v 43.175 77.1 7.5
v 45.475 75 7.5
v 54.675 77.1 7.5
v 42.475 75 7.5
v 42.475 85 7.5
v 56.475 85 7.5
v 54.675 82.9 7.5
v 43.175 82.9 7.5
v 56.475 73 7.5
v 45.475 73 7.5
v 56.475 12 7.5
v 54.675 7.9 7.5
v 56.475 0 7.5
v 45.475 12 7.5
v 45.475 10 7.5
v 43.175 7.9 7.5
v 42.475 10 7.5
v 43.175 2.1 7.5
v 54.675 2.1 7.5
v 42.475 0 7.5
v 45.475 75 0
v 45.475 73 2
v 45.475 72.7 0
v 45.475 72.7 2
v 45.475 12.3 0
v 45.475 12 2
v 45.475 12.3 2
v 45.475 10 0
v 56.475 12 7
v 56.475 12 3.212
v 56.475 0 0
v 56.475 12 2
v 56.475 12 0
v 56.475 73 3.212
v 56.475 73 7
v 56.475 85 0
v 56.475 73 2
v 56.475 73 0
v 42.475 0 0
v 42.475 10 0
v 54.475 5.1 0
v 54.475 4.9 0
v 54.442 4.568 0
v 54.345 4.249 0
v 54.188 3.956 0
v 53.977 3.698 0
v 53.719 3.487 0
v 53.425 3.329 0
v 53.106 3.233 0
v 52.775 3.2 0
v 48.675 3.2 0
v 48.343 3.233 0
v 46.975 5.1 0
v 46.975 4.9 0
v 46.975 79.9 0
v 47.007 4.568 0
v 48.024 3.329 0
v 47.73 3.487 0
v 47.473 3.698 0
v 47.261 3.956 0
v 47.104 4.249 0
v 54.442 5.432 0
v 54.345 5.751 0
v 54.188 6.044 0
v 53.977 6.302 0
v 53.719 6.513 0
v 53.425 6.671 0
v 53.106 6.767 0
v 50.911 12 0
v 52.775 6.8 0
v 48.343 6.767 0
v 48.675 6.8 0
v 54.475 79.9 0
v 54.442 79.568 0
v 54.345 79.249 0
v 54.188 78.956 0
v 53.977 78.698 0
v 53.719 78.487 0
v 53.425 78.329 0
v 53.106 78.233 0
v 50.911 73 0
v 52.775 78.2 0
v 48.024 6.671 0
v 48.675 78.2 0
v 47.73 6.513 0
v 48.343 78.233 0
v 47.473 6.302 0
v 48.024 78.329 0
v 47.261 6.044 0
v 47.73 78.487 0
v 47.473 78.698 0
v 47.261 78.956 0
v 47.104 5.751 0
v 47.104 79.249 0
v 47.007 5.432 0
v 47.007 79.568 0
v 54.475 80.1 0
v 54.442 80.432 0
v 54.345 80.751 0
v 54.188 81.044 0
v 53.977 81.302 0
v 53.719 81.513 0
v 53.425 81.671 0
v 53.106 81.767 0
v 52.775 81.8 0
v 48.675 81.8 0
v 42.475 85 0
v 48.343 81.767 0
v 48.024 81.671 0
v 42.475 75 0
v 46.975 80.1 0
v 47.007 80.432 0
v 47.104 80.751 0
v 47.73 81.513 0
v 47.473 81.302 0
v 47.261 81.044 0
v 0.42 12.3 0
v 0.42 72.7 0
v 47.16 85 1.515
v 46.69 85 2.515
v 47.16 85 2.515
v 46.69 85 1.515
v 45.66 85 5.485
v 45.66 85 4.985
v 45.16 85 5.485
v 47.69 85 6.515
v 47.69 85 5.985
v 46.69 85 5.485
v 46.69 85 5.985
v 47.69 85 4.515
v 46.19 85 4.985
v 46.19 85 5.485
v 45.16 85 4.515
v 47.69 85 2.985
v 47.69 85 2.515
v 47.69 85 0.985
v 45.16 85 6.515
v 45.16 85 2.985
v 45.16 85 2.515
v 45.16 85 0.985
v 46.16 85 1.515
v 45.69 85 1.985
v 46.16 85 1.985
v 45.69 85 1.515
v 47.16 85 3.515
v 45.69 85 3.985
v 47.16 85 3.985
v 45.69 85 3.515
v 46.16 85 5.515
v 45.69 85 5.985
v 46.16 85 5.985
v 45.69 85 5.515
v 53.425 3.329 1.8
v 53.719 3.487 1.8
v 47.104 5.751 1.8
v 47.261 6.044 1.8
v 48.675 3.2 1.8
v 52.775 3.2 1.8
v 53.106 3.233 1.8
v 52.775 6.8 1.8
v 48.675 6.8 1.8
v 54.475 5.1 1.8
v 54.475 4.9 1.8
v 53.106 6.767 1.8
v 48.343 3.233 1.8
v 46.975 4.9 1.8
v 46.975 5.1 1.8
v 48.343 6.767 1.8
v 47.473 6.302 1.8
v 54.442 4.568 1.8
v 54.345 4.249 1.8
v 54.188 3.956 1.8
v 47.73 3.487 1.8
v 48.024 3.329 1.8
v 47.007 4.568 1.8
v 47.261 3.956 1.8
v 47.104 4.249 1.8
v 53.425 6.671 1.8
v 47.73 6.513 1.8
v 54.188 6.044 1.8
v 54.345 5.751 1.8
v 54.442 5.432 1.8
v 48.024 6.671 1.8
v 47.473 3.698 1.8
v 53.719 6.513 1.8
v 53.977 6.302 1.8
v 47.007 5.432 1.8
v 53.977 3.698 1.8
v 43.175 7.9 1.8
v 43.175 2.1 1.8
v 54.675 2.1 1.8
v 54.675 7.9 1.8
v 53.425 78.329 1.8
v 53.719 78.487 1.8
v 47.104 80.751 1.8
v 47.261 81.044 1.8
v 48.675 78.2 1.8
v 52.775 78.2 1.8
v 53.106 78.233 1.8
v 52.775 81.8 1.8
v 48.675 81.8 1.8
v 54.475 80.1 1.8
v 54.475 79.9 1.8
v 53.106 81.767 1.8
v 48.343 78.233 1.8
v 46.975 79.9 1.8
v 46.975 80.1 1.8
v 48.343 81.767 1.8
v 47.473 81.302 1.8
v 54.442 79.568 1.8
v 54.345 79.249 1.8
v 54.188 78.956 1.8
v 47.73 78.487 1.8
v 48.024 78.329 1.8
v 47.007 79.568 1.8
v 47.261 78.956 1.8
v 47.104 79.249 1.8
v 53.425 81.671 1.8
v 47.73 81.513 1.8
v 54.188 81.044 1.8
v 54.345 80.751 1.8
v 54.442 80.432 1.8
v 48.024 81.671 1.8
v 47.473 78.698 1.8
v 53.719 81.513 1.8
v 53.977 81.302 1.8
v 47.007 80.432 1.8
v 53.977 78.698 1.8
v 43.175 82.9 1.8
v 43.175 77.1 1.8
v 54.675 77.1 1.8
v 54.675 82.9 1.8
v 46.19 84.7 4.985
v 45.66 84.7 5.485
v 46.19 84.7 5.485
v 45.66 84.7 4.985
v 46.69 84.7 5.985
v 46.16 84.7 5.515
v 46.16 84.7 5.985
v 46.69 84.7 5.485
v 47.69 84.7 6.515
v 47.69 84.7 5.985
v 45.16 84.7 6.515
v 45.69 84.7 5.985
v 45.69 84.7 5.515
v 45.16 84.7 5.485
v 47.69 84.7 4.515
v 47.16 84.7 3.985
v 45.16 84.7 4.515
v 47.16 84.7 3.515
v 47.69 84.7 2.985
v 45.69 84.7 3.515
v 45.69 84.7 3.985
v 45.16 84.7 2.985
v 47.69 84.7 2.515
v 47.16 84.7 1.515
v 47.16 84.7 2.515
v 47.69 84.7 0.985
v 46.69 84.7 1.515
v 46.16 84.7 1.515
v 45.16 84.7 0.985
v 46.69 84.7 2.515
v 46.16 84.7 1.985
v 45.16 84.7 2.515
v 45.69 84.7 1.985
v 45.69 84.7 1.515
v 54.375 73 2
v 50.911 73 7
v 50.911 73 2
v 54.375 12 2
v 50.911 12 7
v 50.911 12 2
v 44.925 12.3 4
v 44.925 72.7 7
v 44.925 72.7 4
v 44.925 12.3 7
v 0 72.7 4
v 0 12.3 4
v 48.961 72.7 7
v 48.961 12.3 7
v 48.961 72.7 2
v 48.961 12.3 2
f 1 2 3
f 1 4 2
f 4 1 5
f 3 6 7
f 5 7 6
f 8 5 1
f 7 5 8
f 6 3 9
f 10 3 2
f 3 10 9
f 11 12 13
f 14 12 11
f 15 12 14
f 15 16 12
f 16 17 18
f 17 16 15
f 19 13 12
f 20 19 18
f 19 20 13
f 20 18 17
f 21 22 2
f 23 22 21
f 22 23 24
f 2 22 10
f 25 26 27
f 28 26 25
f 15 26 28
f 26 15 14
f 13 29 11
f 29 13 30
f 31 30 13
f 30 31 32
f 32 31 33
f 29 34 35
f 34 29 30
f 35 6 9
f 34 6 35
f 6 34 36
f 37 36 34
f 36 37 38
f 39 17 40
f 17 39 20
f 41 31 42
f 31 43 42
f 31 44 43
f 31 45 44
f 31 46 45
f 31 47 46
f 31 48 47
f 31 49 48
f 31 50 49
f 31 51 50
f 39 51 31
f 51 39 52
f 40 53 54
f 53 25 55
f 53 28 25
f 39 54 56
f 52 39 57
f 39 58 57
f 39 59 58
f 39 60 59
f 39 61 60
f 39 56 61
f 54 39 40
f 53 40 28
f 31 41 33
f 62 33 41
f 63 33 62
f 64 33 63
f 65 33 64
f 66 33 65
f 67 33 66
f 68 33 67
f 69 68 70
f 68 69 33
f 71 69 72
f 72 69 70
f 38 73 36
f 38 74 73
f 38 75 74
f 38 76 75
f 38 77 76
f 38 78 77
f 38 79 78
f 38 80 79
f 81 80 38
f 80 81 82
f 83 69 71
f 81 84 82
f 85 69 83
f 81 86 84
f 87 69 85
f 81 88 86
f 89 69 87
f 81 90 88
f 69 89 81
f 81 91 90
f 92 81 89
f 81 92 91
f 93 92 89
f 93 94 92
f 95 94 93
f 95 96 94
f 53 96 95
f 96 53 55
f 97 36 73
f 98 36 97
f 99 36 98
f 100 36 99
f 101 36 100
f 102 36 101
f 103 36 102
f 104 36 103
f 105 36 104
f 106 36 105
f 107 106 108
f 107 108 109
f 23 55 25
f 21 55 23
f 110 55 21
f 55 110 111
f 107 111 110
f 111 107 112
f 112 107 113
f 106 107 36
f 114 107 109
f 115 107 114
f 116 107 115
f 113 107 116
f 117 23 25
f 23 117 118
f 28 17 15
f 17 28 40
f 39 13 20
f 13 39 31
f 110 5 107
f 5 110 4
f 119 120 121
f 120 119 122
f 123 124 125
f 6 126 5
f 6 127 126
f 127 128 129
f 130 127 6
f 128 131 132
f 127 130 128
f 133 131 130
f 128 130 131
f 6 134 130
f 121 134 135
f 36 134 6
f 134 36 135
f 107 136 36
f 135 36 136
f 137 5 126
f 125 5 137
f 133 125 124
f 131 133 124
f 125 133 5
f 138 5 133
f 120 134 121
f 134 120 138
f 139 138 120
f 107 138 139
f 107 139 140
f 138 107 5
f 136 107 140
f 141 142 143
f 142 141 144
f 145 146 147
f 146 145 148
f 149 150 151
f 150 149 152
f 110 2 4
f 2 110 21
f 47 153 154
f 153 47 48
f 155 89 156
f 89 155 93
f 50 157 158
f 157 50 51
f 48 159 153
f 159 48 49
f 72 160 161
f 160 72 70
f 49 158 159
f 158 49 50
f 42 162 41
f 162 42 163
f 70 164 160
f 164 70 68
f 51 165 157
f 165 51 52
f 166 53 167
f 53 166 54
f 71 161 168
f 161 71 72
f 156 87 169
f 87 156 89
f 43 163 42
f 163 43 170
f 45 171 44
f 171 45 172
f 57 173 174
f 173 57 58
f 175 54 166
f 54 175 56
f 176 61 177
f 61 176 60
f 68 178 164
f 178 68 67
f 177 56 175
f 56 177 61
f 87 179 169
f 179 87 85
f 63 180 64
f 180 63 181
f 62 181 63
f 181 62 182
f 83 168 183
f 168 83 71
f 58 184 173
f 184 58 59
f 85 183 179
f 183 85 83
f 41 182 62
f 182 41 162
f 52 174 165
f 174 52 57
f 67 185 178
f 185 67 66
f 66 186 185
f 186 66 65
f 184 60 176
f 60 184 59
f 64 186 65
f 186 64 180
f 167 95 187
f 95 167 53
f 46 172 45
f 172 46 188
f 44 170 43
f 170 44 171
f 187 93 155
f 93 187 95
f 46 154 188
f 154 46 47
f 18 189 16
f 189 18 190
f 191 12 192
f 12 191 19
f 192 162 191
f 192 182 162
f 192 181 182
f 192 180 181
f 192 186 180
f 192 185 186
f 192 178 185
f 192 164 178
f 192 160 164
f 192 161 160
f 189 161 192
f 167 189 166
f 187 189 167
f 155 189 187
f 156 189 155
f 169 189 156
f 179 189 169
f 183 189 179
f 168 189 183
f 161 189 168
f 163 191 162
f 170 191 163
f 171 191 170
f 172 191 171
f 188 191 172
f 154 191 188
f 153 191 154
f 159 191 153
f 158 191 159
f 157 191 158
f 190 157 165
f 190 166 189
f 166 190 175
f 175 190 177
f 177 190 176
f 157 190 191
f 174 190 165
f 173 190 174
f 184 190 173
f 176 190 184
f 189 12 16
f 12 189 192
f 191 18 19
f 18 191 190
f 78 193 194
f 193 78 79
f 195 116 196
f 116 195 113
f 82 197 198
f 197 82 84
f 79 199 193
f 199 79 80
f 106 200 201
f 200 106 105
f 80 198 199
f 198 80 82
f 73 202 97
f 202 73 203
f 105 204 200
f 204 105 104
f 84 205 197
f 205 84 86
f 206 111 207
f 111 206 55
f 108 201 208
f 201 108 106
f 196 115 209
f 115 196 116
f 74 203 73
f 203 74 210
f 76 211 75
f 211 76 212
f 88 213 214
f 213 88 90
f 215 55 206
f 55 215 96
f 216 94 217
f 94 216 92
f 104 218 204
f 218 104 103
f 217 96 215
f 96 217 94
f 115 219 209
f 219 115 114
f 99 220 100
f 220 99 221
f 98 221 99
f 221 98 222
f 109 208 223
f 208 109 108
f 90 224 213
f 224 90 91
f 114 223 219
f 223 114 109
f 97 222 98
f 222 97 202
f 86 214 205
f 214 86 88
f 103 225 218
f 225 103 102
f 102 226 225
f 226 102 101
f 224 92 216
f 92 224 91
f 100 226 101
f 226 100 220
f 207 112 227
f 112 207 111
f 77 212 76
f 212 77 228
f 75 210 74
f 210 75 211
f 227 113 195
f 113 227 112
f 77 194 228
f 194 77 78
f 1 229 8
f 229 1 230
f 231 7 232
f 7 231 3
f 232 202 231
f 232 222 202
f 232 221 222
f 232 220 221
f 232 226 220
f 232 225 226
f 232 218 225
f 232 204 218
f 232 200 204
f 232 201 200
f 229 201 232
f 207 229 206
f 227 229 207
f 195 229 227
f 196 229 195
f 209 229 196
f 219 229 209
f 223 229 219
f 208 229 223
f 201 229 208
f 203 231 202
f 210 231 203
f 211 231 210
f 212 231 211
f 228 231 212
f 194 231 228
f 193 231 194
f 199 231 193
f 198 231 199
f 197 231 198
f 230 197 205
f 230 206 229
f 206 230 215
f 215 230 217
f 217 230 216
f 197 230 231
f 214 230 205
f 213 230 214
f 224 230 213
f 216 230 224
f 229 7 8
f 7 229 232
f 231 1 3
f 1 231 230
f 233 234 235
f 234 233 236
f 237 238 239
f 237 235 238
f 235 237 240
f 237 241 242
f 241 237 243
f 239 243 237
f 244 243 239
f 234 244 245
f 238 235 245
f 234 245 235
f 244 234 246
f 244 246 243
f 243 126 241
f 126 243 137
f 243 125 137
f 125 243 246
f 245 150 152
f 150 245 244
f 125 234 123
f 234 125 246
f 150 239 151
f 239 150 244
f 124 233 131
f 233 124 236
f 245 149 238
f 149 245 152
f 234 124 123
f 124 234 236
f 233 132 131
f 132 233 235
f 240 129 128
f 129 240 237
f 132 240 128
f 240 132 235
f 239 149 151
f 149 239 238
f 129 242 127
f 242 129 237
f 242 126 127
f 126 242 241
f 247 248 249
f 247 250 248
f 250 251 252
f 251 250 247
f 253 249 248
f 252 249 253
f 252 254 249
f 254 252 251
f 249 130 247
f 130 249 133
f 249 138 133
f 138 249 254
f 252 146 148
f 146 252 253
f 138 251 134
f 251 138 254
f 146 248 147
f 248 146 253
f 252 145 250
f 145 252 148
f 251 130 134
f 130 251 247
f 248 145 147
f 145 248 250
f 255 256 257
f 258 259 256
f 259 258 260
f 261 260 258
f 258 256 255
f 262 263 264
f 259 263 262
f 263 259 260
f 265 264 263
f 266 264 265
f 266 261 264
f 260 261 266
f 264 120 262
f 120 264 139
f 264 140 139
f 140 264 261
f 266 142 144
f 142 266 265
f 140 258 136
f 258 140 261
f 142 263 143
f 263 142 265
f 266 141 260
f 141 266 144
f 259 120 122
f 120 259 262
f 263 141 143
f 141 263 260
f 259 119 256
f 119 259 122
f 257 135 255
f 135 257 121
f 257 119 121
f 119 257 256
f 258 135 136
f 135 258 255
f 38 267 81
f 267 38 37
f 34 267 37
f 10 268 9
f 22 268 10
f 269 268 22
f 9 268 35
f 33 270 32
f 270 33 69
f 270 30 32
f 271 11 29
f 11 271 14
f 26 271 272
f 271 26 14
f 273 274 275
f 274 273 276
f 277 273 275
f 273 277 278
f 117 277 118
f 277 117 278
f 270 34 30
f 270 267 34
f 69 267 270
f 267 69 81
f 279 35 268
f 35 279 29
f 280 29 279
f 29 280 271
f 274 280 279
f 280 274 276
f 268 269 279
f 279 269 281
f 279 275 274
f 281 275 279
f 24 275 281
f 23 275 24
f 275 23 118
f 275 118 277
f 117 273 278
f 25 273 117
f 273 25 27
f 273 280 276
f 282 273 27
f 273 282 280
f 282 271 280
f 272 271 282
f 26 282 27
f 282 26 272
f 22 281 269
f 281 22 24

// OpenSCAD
// 固定耳齊平與滿寬直貼膠分牌閘
$fn=64;
translate([120.92467,42.5,-43]){rotate([0,-90,0]){union(){difference(){difference(){difference(){difference(){difference(){difference(){difference(){difference(){union(){union(){translate([44.5,-33,64.45]){cube([6,66,11]);}translate([43,-42.5,64.45]){cube([7.5,10,14]);}}translate([43,32.5,64.45]){cube([7.5,10,14]);}}translate([43.5,-27.5,70.5]){cube([9,55,6]);}}translate([44.45,-27.6,64.4]){cube([1.1,55.2,4.1]);}}translate([39,-37.5,70.2]){rotate([0,90,0]){translate([0,0,0]){translate([0,0,0]){linear_extrude(height=18)polygon([[3.75,0.1],[3.71733,0.43165],[3.6206,0.75056],[3.4635,1.04447],[3.25208,1.30208],[2.99447,1.5135],[2.70056,1.6706],[2.38165,1.76733],[2.05,1.8],[-2.05,1.8],[-2.38165,1.76733],[-2.70056,1.6706],[-2.99447,1.5135],[-3.25208,1.30208],[-3.4635,1.04447],[-3.6206,0.75056],[-3.71733,0.43165],[-3.75,0.1],[-3.75,-0.1],[-3.71733,-0.43165],[-3.6206,-0.75056],[-3.4635,-1.04447],[-3.25208,-1.30208],[-2.99447,-1.5135],[-2.70056,-1.6706],[-2.38165,-1.76733],[-2.05,-1.8],[2.05,-1.8],[2.38165,-1.76733],[2.70056,-1.6706],[2.99447,-1.5135],[3.25208,-1.30208],[3.4635,-1.04447],[3.6206,-0.75056],[3.71733,-0.43165],[3.75,-0.1]]);}}}}}translate([44.8,-40.4,66.25]){cube([6,5.8,11.5]);}}translate([39,37.5,70.2]){rotate([0,90,0]){translate([0,0,0]){translate([0,0,0]){linear_extrude(height=18)polygon([[3.75,0.1],[3.71733,0.43165],[3.6206,0.75056],[3.4635,1.04447],[3.25208,1.30208],[2.99447,1.5135],[2.70056,1.6706],[2.38165,1.76733],[2.05,1.8],[-2.05,1.8],[-2.38165,1.76733],[-2.70056,1.6706],[-2.99447,1.5135],[-3.25208,1.30208],[-3.4635,1.04447],[-3.6206,0.75056],[-3.71733,0.43165],[-3.75,0.1],[-3.75,-0.1],[-3.71733,-0.43165],[-3.6206,-0.75056],[-3.4635,-1.04447],[-3.25208,-1.30208],[-2.99447,-1.5135],[-2.70056,-1.6706],[-2.38165,-1.76733],[-2.05,-1.8],[2.05,-1.8],[2.38165,-1.76733],[2.70056,-1.6706],[2.99447,-1.5135],[3.25208,-1.30208],[3.4635,-1.04447],[3.6206,-0.75056],[3.71733,-0.43165],[3.75,-0.1]]);}}}}}translate([44.8,34.6,66.25]){cube([6,5.8,11.5]);}}multmatrix([[-1,0,0,46.75],[0,0,1,42.5],[0,1,0,74.5],[0,0,0,1]]){union(){union(){union(){union(){union(){union(){union(){union(){union(){union(){union(){union(){union(){union(){union(){union(){union(){union(){union(){union(){union(){union(){union(){union(){union(){union(){union(){union(){union(){union(){union(){translate([-2.765,0.735,-0.3]){cube([0.53,0.53,0.42]);}translate([-2.265,0.735,-0.3]){cube([0.53,0.53,0.42]);}}translate([-2.765,0.235,-0.3]){cube([0.53,0.53,0.42]);}}translate([-1.765,0.235,-0.3]){cube([0.53,0.53,0.42]);}}translate([-2.765,-0.265,-0.3]){cube([0.53,0.53,0.42]);}}translate([-2.265,-0.265,-0.3]){cube([0.53,0.53,0.42]);}}translate([-2.765,-0.765,-0.3]){cube([0.53,0.53,0.42]);}}translate([-2.765,-1.265,-0.3]){cube([0.53,0.53,0.42]);}}translate([-0.765,0.735,-0.3]){cube([0.53,0.53,0.42]);}}translate([-0.265,0.735,-0.3]){cube([0.53,0.53,0.42]);}}translate([0.235,0.735,-0.3]){cube([0.53,0.53,0.42]);}}translate([-0.765,0.235,-0.3]){cube([0.53,0.53,0.42]);}}translate([0.235,0.235,-0.3]){cube([0.53,0.53,0.42]);}}translate([-0.765,-0.265,-0.3]){cube([0.53,0.53,0.42]);}}translate([0.235,-0.265,-0.3]){cube([0.53,0.53,0.42]);}}translate([-0.765,-0.765,-0.3]){cube([0.53,0.53,0.42]);}}translate([0.235,-0.765,-0.3]){cube([0.53,0.53,0.42]);}}translate([-0.765,-1.265,-0.3]){cube([0.53,0.53,0.42]);}}translate([-0.265,-1.265,-0.3]){cube([0.53,0.53,0.42]);}}translate([0.235,-1.265,-0.3]){cube([0.53,0.53,0.42]);}}translate([1.235,0.735,-0.3]){cube([0.53,0.53,0.42]);}}translate([1.735,0.735,-0.3]){cube([0.53,0.53,0.42]);}}translate([2.235,0.735,-0.3]){cube([0.53,0.53,0.42]);}}translate([1.235,0.235,-0.3]){cube([0.53,0.53,0.42]);}}translate([2.235,0.235,-0.3]){cube([0.53,0.53,0.42]);}}translate([1.235,-0.265,-0.3]){cube([0.53,0.53,0.42]);}}translate([1.735,-0.265,-0.3]){cube([0.53,0.53,0.42]);}}translate([2.235,-0.265,-0.3]){cube([0.53,0.53,0.42]);}}translate([2.235,-0.765,-0.3]){cube([0.53,0.53,0.42]);}}translate([1.235,-1.265,-0.3]){cube([0.53,0.53,0.42]);}}translate([1.735,-1.265,-0.3]){cube([0.53,0.53,0.42]);}}translate([2.235,-1.265,-0.3]){cube([0.53,0.53,0.42]);}}}}translate([-12.5,-30.5,40]){cube([120,61,120]);}}union(){union(){intersection(){multmatrix([[1,0,0,0],[0,0,-1,30.5],[0,1,0,64.45],[0,0,0,1]]){translate([0,0,0]){linear_extrude(height=61)polygon([[46.21244,0],[50,0],[50,11.55],[47,11.55],[47,56.47468],[43,56.05426],[43,5.5641]]);}}multmatrix([[0,0,1,0],[1,0,0,0],[0,1,0,64.45],[0,0,0,1]]){translate([0,0,0]){linear_extrude(height=120)polygon([[-30.5,-1],[30.5,-1],[30.5,5.5641],[30.2,7.5141],[30.2,57.47468],[-30.2,57.47468],[-30.2,7.5141],[-30.5,5.5641]]);}}}union(){translate([46.31244,-30.7,64.45]){cube([3.68756,0.4,3.8]);}translate([46.31244,30.3,64.45]){cube([3.68756,0.4,3.8]);}}}union(){union(){union(){translate([43,-32.7,64.45]){cube([2,2.2,11]);}translate([43,-32.7,70.0141]){cube([2,2.7,5.4359]);}}translate([43,30.5,64.45]){cube([2,2.2,11]);}}translate([43,30,70.0141]){cube([2,2.7,5.4359]);}}}}}}
